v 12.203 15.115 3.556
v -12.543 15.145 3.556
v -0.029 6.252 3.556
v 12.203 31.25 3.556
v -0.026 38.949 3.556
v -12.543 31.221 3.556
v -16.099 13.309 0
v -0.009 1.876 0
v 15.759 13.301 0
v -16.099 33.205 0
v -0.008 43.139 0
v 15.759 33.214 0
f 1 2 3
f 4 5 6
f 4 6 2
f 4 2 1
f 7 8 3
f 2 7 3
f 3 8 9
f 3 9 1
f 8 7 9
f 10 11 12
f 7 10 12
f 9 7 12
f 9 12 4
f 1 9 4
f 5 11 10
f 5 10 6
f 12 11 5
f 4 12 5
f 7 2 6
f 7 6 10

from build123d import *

# Parameters (mm, degrees)
F1_DEPTH    = 0.508
F2_DEPTH    = 3.048
F3_T1_DEPTH = 47.7471989741
F3_T3_DEPTH = 47.4709696523
F3_T5_DEPTH = 47.6607350592
F3_T7_DEPTH = 46.5501838511
F3_T9_DEPTH = 46.8386979916


# Not quite as in the source:
# - a fillet or chamfer that OpenCascade refuses, or shapes differently, is made with other operations: its cross-section is extruded or revolved along the edge and cut away or added


with BuildPart() as f1:
    # F0 (on Top) → F1 (new body)
    with BuildSketch(Plane.XY):
        Polygon((-17.6225993782, 12.5228120014), (0, 0), (17.2826144844, 12.5228120014), (17.2826144844, 34.0552479029), (0, 44.934798032), (-17.6225993782, 34.0552479029), align=None)
    extrude(amount=F1_DEPTH)

    # F2 (add): a face of the model
    f2_faces = [f1.faces().sort_by_distance(p)[0] for p in [
        (-0.1500416402, 22.8299999891, 0.508),
    ]]
    extrude(f2_faces, amount=F2_DEPTH)

    # F3: chamfer of 5.08 on 6 edges, made by hand

    # F3_s2 → F3_t1 (cut)
    with BuildSketch(Plane(origin=(-28.2718126223, 20.0902594906, 0), x_dir=(0, 0, 1), z_dir=(0.8151478349, -0.5792529735, 0))):
        Polygon((-1.524, 0), (3.556, -5.08), (3.556, 0), align=None)
    extrude(amount=F3_T1_DEPTH, mode=Mode.SUBTRACT)

    # F3_s4 → F3_t3 (cut)
    with BuildSketch(Plane(origin=(-10.5789320411, -7.6653898197, 0), x_dir=(0, 0, 1), z_dir=(0.8097681351, 0.5867500042, 0))):
        Polygon((-1.524, 0), (3.556, -5.08), (3.556, 0), align=None)
    extrude(amount=F3_T3_DEPTH, mode=Mode.SUBTRACT)

    # F3_s6 → F3_t5 (cut)
    with BuildSketch(Plane.XZ.offset(-47.1193974817)):
        Polygon((17.2826144844, -1.524), (12.2026144844, 3.556), (17.2826144844, 3.556), align=None)
        Polygon((-12.5425993782, 3.556), (-17.6225993782, -1.524), (-17.6225993782, 3.556), align=None)
    extrude(amount=F3_T5_DEPTH, mode=Mode.SUBTRACT)

    # F3_s8 → F3_t7 (cut)
    with BuildSketch(Plane(origin=(8.0798332195, -5.0863224789, 0), x_dir=(0, 0, 1), z_dir=(-0.846279114, 0.5327397688, 0))):
        Polygon((-1.524, 38.0273810661), (3.556, 32.9473810661), (3.556, 38.0273810661), align=None)
    extrude(amount=F3_T7_DEPTH, mode=Mode.SUBTRACT)

    # F3_s10 → F3_t9 (cut)
    with BuildSketch(Plane(origin=(31.2020521098, 19.2630089793, 0), x_dir=(0, 0, 1), z_dir=(-0.850905843, -0.5253182334, 0))):
        Polygon((-1.524, 38.2352821986), (3.556, 33.1552821986), (3.556, 38.2352821986), align=None)
    extrude(amount=F3_T9_DEPTH, mode=Mode.SUBTRACT)


solid = f1.part
